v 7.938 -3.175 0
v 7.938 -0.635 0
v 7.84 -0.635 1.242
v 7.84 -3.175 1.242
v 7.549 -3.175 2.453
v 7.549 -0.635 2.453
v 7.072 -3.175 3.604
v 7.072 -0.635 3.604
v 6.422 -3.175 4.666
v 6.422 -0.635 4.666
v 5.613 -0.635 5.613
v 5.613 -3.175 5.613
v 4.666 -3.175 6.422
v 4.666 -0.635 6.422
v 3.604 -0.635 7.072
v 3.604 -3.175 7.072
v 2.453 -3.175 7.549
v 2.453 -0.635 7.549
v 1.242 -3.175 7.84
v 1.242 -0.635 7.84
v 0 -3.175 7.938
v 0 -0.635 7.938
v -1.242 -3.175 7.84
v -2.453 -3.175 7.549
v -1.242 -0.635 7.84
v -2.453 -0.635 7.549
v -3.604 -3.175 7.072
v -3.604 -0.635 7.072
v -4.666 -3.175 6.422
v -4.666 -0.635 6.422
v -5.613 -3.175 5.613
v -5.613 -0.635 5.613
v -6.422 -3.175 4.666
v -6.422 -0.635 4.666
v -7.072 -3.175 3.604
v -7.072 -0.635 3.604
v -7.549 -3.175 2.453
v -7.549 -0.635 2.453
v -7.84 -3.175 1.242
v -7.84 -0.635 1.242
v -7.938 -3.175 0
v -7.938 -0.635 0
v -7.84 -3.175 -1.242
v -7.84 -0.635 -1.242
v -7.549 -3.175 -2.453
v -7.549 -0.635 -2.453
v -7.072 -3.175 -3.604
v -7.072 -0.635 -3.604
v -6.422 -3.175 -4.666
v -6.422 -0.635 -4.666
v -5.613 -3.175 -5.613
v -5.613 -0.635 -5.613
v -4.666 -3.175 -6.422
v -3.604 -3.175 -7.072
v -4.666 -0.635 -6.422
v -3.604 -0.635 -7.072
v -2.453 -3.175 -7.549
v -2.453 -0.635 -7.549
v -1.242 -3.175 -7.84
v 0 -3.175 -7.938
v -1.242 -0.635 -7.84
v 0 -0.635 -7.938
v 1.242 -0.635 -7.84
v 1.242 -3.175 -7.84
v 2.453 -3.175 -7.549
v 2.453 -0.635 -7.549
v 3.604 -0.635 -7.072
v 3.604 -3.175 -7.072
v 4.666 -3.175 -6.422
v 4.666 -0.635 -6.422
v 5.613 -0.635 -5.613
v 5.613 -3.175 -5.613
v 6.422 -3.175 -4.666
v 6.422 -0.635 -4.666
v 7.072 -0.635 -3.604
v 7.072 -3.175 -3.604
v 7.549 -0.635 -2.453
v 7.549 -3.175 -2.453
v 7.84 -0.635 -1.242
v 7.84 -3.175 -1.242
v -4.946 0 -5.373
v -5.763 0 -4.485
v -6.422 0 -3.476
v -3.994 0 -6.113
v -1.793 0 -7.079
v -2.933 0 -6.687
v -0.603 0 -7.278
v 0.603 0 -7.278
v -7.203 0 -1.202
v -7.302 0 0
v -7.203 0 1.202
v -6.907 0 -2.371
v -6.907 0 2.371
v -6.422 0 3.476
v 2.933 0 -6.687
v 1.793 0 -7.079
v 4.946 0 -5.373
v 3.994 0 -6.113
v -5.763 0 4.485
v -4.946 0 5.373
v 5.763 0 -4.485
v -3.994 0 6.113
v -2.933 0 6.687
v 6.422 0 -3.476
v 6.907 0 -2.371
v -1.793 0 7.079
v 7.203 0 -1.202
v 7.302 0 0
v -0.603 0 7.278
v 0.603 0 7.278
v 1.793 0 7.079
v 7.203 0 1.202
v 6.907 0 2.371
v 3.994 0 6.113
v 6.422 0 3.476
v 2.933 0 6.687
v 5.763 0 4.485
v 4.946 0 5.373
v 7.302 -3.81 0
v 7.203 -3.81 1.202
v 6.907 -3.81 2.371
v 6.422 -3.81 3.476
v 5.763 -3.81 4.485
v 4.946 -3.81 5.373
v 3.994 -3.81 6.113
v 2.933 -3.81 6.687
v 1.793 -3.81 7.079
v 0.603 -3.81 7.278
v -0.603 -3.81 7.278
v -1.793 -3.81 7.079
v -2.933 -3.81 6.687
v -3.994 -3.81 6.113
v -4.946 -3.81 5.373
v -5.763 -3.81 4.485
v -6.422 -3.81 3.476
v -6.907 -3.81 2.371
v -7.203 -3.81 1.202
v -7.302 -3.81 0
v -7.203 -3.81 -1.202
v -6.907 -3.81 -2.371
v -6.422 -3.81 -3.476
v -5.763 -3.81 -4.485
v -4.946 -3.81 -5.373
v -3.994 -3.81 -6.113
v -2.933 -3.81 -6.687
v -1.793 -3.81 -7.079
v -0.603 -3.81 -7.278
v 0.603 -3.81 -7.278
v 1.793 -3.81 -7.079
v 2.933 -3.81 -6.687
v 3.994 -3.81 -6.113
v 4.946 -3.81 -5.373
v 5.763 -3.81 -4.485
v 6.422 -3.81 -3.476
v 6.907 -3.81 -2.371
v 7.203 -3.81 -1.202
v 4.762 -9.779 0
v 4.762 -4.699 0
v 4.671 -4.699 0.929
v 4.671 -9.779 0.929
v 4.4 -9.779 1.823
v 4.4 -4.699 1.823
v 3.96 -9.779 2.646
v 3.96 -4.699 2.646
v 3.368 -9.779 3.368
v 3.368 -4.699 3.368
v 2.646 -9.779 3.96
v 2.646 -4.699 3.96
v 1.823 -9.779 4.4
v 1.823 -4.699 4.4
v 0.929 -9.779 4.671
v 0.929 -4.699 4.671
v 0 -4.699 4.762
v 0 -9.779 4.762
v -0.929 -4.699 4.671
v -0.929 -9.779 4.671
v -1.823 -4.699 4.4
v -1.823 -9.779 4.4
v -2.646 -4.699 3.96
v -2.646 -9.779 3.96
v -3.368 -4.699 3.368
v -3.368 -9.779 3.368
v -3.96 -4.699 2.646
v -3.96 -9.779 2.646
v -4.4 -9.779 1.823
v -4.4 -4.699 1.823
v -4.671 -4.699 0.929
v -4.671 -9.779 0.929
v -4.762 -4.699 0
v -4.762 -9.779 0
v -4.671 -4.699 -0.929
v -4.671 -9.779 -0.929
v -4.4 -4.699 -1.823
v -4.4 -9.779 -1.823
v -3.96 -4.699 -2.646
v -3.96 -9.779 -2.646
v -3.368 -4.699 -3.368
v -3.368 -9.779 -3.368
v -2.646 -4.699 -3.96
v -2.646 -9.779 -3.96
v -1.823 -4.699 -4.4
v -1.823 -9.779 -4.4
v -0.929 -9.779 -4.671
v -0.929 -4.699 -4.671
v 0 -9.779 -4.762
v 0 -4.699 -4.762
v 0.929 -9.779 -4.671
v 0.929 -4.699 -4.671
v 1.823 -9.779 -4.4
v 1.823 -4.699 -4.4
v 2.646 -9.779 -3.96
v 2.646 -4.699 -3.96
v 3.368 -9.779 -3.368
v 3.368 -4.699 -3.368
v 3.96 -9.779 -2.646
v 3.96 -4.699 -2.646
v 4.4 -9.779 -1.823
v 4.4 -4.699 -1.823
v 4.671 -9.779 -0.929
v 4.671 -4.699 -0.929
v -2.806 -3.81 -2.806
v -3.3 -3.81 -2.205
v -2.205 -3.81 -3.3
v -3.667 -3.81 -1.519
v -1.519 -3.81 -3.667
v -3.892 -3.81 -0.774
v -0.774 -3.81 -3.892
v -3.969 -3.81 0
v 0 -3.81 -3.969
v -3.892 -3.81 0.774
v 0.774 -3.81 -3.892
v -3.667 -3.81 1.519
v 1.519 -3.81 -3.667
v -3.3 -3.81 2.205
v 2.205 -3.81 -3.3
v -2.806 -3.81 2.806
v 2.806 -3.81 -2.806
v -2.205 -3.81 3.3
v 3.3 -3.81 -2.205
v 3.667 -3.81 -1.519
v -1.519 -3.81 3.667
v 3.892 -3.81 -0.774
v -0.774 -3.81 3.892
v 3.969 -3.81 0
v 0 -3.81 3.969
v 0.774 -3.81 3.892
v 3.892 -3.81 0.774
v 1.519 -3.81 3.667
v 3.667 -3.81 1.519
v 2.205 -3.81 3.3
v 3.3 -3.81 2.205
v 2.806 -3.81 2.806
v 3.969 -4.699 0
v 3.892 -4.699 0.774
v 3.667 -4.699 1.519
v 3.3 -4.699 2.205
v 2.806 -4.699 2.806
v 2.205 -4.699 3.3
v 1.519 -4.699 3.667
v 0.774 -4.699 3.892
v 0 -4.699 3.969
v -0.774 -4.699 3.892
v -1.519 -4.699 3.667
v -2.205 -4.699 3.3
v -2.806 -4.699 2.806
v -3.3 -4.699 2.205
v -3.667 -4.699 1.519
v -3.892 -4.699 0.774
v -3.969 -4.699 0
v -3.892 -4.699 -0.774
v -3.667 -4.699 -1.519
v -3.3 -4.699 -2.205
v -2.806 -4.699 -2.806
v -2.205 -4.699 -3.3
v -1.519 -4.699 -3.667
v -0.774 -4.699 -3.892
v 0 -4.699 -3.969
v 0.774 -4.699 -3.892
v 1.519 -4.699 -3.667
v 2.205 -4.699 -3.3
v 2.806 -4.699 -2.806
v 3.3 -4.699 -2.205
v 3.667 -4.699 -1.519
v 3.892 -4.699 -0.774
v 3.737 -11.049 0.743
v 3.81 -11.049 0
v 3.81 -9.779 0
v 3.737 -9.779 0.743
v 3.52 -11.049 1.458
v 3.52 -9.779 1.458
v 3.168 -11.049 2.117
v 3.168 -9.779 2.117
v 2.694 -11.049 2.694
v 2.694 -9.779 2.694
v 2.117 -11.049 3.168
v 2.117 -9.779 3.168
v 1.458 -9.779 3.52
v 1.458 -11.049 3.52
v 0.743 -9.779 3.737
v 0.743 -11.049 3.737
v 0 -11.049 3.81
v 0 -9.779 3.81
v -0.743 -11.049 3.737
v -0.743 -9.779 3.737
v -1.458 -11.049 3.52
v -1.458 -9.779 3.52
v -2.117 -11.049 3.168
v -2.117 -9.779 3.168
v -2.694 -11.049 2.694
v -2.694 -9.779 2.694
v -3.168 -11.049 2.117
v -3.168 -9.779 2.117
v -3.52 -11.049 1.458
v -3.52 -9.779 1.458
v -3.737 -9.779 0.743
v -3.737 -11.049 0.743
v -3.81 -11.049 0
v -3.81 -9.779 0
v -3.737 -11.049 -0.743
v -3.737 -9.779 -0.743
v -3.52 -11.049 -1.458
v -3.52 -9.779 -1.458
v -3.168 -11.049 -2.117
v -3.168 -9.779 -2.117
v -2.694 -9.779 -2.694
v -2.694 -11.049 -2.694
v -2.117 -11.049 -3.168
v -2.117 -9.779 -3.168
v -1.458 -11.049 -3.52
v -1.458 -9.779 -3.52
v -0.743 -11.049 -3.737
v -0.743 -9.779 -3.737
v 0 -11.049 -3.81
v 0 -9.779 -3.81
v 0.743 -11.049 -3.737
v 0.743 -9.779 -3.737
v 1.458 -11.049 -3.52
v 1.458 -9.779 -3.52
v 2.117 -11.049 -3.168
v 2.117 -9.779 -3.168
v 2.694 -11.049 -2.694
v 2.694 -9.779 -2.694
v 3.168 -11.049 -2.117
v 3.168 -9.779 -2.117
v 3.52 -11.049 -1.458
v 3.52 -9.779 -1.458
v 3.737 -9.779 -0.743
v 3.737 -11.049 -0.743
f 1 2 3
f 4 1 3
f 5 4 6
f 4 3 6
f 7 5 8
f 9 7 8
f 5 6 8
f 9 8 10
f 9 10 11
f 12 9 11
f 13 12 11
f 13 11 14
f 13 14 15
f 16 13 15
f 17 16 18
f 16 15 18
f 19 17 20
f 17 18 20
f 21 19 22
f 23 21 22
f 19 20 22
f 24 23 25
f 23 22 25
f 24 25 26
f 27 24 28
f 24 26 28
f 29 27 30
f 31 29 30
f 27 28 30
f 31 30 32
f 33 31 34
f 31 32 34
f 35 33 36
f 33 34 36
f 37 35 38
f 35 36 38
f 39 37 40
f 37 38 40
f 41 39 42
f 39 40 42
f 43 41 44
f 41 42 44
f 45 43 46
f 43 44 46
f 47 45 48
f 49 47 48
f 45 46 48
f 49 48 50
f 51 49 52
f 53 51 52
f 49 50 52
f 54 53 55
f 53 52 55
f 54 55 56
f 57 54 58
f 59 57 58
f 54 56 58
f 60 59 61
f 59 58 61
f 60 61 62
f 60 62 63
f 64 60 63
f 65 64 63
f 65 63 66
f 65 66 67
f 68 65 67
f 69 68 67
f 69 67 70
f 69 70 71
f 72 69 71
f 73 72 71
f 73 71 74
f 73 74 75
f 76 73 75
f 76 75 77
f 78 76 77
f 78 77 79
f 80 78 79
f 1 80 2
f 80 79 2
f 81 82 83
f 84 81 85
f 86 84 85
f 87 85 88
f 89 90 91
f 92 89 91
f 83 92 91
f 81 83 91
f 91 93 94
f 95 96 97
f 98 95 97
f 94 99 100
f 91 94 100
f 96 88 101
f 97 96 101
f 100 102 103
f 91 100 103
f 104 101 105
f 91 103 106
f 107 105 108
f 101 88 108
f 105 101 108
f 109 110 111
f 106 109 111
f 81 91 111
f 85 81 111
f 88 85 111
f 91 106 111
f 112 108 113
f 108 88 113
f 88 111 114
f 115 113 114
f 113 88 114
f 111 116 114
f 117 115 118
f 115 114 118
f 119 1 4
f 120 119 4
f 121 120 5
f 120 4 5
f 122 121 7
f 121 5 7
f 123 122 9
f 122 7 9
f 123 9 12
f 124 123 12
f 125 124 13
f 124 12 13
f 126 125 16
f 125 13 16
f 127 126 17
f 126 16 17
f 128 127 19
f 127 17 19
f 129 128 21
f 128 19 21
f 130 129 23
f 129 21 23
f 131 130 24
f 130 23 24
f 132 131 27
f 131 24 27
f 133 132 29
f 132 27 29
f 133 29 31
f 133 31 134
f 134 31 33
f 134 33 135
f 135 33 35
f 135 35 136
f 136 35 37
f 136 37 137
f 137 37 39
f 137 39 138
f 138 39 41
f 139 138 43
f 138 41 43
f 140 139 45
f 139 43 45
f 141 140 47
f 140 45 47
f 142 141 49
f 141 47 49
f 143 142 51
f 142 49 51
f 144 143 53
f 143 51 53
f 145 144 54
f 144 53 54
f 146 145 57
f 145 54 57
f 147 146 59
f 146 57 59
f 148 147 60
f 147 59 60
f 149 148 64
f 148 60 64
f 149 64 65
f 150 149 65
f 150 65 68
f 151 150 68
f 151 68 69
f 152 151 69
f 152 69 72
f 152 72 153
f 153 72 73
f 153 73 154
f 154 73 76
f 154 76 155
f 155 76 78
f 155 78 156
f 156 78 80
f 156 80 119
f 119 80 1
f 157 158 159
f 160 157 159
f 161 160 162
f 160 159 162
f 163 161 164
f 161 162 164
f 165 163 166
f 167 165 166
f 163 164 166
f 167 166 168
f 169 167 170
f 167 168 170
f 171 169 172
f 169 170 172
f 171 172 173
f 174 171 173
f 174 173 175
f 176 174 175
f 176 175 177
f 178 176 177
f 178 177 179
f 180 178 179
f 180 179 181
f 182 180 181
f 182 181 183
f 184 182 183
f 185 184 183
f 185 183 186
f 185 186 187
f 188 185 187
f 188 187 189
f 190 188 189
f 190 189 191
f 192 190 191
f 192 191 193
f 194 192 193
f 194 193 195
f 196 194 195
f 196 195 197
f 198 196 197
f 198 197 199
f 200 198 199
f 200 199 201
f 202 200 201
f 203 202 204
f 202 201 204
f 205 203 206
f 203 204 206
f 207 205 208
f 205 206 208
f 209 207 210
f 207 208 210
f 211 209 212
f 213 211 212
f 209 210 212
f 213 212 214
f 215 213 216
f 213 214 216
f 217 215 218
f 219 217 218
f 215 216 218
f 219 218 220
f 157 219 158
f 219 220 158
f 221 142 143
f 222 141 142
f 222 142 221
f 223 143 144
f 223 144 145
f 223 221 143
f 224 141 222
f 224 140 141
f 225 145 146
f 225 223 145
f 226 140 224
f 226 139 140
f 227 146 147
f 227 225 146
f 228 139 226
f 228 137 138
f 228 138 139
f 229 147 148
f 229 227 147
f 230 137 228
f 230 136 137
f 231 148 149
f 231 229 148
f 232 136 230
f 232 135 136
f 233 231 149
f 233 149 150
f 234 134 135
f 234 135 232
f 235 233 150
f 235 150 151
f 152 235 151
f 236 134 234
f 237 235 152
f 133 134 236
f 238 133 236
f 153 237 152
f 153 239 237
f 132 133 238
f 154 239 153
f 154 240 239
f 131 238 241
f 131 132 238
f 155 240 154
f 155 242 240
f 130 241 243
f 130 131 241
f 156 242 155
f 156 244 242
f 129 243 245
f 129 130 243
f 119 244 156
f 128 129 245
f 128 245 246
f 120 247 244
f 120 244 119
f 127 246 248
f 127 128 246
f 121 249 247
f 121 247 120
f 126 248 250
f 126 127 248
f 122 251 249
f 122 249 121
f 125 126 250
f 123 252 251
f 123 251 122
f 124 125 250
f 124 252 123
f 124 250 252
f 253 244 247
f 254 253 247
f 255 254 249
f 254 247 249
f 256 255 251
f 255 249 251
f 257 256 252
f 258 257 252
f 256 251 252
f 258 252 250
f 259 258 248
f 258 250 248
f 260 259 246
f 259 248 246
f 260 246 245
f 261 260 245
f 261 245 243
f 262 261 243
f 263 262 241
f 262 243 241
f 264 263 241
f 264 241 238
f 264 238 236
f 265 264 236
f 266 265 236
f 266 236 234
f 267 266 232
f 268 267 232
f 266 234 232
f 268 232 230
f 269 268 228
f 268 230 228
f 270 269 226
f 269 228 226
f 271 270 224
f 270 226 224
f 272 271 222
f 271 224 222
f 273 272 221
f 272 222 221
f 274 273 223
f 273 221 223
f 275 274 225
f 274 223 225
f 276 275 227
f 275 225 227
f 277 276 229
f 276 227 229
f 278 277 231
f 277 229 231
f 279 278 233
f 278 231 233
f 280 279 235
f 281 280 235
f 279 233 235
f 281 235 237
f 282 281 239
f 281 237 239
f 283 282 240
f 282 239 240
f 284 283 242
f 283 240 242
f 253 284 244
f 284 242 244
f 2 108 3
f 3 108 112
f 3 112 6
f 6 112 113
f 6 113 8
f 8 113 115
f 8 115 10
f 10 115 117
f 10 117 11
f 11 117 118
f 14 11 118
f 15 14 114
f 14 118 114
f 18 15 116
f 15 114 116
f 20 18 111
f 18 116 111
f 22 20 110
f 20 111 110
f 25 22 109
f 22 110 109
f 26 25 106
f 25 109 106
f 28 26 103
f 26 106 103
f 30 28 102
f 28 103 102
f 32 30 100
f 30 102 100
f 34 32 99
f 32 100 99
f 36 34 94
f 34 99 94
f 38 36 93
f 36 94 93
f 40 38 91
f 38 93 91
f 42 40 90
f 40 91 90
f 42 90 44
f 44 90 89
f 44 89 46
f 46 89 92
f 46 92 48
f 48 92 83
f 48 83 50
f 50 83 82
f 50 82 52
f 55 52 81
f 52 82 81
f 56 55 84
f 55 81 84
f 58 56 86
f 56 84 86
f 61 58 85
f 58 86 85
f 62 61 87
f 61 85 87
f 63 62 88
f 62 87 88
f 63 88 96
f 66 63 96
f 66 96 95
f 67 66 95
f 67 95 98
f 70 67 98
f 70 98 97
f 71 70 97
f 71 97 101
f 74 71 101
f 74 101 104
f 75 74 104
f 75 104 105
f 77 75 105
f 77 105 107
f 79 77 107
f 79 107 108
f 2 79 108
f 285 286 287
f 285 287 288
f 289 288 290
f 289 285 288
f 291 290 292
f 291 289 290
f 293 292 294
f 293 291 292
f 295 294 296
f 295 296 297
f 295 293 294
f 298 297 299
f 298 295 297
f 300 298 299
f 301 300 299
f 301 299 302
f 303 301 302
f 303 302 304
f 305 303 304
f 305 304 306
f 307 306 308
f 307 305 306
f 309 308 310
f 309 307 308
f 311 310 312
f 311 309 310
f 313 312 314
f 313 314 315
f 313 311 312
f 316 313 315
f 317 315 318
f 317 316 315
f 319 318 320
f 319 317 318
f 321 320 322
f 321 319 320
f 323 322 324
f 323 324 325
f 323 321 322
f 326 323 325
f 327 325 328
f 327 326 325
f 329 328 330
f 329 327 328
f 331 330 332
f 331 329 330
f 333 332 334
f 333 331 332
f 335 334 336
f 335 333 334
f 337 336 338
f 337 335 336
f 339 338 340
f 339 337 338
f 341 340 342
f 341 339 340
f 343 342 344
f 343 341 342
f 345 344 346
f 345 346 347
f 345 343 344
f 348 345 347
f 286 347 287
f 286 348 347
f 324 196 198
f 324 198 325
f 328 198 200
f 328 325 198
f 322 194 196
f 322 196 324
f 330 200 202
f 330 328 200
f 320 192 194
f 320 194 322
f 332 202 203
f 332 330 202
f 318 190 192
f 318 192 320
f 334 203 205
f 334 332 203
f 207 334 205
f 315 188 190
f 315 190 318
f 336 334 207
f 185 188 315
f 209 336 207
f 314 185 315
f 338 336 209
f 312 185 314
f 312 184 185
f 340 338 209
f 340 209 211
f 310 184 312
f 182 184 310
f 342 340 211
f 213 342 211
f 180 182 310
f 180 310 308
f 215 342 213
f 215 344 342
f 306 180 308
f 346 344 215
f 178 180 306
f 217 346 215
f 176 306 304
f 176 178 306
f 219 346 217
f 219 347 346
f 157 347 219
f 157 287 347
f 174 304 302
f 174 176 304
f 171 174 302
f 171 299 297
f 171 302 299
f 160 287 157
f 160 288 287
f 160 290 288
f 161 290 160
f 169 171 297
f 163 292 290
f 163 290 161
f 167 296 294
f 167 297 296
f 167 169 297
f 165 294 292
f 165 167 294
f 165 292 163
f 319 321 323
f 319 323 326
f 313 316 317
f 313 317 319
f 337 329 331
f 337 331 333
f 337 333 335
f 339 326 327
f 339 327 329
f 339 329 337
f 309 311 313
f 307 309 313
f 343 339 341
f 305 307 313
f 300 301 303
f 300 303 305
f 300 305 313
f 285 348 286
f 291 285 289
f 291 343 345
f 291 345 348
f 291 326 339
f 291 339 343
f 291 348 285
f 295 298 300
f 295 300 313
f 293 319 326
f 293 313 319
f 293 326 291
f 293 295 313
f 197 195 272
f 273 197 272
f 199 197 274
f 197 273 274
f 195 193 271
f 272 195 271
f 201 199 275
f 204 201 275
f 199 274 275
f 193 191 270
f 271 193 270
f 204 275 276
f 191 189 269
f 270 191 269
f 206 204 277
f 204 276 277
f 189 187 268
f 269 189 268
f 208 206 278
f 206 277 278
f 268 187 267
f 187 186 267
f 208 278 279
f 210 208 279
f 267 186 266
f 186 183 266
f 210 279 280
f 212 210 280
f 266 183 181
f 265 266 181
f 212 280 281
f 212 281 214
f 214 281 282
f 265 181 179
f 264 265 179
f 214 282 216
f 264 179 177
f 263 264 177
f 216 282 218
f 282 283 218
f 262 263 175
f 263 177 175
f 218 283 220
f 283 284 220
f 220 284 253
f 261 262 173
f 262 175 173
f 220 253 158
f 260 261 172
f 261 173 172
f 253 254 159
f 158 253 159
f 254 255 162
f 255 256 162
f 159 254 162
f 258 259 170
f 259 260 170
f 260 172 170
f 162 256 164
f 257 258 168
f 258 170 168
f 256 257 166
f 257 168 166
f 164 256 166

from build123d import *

# Parameters (mm, degrees)
F0_R      = 7.9375
F1_DEPTH  = 3.81
F2_R      = 4.7625
F3_DEPTH  = 6.35
F5_R      = 3.96875
F6_DEPTH  = 0.889
F7_R      = 4.7625
F7_R_2    = 3.96875
F8_DEPTH  = 6.35
F9_R      = 4.7625
F9_R_2    = 3.81
F10_DEPTH = 1.27
F11_SIZE  = 0.635


with BuildPart() as f1:
    # F0 (on Front) → F1 (new body)
    with BuildSketch(Plane.XZ):
        Circle(F0_R)
    extrude(amount=F1_DEPTH)

    # F5 (on face) → F6 (join)
    with BuildSketch(Plane.XZ.offset(3.81)):
        Circle(F5_R)
    extrude(amount=F6_DEPTH)

    # F7 (on face) → F8 (join)
    with BuildSketch(Plane.XZ.offset(4.699)):
        Circle(F7_R)
        Circle(F7_R_2, mode=Mode.SUBTRACT)
        Circle(F7_R_2)
    extrude(amount=F8_DEPTH)

    # F9 (on face) → F10 (cut)
    with BuildSketch(Plane.XZ.offset(11.049)):
        Circle(F9_R)
        Circle(F9_R_2, mode=Mode.SUBTRACT)
    extrude(amount=-F10_DEPTH, mode=Mode.SUBTRACT)

    # F11
    f11_edges = [f1.edges().sort_by_distance(p)[0] for p in [
        (-7.9375, -3.81, 0),
        (-7.9375, 0, 0),
    ]]
    chamfer(f11_edges, length=F11_SIZE)


with BuildPart() as f3:
    # F2 (on face) → F3 (new body)
    with BuildSketch(Plane.XZ.offset(3.81)):
        Circle(F2_R)
    extrude(amount=F3_DEPTH)


solid = f1.part
